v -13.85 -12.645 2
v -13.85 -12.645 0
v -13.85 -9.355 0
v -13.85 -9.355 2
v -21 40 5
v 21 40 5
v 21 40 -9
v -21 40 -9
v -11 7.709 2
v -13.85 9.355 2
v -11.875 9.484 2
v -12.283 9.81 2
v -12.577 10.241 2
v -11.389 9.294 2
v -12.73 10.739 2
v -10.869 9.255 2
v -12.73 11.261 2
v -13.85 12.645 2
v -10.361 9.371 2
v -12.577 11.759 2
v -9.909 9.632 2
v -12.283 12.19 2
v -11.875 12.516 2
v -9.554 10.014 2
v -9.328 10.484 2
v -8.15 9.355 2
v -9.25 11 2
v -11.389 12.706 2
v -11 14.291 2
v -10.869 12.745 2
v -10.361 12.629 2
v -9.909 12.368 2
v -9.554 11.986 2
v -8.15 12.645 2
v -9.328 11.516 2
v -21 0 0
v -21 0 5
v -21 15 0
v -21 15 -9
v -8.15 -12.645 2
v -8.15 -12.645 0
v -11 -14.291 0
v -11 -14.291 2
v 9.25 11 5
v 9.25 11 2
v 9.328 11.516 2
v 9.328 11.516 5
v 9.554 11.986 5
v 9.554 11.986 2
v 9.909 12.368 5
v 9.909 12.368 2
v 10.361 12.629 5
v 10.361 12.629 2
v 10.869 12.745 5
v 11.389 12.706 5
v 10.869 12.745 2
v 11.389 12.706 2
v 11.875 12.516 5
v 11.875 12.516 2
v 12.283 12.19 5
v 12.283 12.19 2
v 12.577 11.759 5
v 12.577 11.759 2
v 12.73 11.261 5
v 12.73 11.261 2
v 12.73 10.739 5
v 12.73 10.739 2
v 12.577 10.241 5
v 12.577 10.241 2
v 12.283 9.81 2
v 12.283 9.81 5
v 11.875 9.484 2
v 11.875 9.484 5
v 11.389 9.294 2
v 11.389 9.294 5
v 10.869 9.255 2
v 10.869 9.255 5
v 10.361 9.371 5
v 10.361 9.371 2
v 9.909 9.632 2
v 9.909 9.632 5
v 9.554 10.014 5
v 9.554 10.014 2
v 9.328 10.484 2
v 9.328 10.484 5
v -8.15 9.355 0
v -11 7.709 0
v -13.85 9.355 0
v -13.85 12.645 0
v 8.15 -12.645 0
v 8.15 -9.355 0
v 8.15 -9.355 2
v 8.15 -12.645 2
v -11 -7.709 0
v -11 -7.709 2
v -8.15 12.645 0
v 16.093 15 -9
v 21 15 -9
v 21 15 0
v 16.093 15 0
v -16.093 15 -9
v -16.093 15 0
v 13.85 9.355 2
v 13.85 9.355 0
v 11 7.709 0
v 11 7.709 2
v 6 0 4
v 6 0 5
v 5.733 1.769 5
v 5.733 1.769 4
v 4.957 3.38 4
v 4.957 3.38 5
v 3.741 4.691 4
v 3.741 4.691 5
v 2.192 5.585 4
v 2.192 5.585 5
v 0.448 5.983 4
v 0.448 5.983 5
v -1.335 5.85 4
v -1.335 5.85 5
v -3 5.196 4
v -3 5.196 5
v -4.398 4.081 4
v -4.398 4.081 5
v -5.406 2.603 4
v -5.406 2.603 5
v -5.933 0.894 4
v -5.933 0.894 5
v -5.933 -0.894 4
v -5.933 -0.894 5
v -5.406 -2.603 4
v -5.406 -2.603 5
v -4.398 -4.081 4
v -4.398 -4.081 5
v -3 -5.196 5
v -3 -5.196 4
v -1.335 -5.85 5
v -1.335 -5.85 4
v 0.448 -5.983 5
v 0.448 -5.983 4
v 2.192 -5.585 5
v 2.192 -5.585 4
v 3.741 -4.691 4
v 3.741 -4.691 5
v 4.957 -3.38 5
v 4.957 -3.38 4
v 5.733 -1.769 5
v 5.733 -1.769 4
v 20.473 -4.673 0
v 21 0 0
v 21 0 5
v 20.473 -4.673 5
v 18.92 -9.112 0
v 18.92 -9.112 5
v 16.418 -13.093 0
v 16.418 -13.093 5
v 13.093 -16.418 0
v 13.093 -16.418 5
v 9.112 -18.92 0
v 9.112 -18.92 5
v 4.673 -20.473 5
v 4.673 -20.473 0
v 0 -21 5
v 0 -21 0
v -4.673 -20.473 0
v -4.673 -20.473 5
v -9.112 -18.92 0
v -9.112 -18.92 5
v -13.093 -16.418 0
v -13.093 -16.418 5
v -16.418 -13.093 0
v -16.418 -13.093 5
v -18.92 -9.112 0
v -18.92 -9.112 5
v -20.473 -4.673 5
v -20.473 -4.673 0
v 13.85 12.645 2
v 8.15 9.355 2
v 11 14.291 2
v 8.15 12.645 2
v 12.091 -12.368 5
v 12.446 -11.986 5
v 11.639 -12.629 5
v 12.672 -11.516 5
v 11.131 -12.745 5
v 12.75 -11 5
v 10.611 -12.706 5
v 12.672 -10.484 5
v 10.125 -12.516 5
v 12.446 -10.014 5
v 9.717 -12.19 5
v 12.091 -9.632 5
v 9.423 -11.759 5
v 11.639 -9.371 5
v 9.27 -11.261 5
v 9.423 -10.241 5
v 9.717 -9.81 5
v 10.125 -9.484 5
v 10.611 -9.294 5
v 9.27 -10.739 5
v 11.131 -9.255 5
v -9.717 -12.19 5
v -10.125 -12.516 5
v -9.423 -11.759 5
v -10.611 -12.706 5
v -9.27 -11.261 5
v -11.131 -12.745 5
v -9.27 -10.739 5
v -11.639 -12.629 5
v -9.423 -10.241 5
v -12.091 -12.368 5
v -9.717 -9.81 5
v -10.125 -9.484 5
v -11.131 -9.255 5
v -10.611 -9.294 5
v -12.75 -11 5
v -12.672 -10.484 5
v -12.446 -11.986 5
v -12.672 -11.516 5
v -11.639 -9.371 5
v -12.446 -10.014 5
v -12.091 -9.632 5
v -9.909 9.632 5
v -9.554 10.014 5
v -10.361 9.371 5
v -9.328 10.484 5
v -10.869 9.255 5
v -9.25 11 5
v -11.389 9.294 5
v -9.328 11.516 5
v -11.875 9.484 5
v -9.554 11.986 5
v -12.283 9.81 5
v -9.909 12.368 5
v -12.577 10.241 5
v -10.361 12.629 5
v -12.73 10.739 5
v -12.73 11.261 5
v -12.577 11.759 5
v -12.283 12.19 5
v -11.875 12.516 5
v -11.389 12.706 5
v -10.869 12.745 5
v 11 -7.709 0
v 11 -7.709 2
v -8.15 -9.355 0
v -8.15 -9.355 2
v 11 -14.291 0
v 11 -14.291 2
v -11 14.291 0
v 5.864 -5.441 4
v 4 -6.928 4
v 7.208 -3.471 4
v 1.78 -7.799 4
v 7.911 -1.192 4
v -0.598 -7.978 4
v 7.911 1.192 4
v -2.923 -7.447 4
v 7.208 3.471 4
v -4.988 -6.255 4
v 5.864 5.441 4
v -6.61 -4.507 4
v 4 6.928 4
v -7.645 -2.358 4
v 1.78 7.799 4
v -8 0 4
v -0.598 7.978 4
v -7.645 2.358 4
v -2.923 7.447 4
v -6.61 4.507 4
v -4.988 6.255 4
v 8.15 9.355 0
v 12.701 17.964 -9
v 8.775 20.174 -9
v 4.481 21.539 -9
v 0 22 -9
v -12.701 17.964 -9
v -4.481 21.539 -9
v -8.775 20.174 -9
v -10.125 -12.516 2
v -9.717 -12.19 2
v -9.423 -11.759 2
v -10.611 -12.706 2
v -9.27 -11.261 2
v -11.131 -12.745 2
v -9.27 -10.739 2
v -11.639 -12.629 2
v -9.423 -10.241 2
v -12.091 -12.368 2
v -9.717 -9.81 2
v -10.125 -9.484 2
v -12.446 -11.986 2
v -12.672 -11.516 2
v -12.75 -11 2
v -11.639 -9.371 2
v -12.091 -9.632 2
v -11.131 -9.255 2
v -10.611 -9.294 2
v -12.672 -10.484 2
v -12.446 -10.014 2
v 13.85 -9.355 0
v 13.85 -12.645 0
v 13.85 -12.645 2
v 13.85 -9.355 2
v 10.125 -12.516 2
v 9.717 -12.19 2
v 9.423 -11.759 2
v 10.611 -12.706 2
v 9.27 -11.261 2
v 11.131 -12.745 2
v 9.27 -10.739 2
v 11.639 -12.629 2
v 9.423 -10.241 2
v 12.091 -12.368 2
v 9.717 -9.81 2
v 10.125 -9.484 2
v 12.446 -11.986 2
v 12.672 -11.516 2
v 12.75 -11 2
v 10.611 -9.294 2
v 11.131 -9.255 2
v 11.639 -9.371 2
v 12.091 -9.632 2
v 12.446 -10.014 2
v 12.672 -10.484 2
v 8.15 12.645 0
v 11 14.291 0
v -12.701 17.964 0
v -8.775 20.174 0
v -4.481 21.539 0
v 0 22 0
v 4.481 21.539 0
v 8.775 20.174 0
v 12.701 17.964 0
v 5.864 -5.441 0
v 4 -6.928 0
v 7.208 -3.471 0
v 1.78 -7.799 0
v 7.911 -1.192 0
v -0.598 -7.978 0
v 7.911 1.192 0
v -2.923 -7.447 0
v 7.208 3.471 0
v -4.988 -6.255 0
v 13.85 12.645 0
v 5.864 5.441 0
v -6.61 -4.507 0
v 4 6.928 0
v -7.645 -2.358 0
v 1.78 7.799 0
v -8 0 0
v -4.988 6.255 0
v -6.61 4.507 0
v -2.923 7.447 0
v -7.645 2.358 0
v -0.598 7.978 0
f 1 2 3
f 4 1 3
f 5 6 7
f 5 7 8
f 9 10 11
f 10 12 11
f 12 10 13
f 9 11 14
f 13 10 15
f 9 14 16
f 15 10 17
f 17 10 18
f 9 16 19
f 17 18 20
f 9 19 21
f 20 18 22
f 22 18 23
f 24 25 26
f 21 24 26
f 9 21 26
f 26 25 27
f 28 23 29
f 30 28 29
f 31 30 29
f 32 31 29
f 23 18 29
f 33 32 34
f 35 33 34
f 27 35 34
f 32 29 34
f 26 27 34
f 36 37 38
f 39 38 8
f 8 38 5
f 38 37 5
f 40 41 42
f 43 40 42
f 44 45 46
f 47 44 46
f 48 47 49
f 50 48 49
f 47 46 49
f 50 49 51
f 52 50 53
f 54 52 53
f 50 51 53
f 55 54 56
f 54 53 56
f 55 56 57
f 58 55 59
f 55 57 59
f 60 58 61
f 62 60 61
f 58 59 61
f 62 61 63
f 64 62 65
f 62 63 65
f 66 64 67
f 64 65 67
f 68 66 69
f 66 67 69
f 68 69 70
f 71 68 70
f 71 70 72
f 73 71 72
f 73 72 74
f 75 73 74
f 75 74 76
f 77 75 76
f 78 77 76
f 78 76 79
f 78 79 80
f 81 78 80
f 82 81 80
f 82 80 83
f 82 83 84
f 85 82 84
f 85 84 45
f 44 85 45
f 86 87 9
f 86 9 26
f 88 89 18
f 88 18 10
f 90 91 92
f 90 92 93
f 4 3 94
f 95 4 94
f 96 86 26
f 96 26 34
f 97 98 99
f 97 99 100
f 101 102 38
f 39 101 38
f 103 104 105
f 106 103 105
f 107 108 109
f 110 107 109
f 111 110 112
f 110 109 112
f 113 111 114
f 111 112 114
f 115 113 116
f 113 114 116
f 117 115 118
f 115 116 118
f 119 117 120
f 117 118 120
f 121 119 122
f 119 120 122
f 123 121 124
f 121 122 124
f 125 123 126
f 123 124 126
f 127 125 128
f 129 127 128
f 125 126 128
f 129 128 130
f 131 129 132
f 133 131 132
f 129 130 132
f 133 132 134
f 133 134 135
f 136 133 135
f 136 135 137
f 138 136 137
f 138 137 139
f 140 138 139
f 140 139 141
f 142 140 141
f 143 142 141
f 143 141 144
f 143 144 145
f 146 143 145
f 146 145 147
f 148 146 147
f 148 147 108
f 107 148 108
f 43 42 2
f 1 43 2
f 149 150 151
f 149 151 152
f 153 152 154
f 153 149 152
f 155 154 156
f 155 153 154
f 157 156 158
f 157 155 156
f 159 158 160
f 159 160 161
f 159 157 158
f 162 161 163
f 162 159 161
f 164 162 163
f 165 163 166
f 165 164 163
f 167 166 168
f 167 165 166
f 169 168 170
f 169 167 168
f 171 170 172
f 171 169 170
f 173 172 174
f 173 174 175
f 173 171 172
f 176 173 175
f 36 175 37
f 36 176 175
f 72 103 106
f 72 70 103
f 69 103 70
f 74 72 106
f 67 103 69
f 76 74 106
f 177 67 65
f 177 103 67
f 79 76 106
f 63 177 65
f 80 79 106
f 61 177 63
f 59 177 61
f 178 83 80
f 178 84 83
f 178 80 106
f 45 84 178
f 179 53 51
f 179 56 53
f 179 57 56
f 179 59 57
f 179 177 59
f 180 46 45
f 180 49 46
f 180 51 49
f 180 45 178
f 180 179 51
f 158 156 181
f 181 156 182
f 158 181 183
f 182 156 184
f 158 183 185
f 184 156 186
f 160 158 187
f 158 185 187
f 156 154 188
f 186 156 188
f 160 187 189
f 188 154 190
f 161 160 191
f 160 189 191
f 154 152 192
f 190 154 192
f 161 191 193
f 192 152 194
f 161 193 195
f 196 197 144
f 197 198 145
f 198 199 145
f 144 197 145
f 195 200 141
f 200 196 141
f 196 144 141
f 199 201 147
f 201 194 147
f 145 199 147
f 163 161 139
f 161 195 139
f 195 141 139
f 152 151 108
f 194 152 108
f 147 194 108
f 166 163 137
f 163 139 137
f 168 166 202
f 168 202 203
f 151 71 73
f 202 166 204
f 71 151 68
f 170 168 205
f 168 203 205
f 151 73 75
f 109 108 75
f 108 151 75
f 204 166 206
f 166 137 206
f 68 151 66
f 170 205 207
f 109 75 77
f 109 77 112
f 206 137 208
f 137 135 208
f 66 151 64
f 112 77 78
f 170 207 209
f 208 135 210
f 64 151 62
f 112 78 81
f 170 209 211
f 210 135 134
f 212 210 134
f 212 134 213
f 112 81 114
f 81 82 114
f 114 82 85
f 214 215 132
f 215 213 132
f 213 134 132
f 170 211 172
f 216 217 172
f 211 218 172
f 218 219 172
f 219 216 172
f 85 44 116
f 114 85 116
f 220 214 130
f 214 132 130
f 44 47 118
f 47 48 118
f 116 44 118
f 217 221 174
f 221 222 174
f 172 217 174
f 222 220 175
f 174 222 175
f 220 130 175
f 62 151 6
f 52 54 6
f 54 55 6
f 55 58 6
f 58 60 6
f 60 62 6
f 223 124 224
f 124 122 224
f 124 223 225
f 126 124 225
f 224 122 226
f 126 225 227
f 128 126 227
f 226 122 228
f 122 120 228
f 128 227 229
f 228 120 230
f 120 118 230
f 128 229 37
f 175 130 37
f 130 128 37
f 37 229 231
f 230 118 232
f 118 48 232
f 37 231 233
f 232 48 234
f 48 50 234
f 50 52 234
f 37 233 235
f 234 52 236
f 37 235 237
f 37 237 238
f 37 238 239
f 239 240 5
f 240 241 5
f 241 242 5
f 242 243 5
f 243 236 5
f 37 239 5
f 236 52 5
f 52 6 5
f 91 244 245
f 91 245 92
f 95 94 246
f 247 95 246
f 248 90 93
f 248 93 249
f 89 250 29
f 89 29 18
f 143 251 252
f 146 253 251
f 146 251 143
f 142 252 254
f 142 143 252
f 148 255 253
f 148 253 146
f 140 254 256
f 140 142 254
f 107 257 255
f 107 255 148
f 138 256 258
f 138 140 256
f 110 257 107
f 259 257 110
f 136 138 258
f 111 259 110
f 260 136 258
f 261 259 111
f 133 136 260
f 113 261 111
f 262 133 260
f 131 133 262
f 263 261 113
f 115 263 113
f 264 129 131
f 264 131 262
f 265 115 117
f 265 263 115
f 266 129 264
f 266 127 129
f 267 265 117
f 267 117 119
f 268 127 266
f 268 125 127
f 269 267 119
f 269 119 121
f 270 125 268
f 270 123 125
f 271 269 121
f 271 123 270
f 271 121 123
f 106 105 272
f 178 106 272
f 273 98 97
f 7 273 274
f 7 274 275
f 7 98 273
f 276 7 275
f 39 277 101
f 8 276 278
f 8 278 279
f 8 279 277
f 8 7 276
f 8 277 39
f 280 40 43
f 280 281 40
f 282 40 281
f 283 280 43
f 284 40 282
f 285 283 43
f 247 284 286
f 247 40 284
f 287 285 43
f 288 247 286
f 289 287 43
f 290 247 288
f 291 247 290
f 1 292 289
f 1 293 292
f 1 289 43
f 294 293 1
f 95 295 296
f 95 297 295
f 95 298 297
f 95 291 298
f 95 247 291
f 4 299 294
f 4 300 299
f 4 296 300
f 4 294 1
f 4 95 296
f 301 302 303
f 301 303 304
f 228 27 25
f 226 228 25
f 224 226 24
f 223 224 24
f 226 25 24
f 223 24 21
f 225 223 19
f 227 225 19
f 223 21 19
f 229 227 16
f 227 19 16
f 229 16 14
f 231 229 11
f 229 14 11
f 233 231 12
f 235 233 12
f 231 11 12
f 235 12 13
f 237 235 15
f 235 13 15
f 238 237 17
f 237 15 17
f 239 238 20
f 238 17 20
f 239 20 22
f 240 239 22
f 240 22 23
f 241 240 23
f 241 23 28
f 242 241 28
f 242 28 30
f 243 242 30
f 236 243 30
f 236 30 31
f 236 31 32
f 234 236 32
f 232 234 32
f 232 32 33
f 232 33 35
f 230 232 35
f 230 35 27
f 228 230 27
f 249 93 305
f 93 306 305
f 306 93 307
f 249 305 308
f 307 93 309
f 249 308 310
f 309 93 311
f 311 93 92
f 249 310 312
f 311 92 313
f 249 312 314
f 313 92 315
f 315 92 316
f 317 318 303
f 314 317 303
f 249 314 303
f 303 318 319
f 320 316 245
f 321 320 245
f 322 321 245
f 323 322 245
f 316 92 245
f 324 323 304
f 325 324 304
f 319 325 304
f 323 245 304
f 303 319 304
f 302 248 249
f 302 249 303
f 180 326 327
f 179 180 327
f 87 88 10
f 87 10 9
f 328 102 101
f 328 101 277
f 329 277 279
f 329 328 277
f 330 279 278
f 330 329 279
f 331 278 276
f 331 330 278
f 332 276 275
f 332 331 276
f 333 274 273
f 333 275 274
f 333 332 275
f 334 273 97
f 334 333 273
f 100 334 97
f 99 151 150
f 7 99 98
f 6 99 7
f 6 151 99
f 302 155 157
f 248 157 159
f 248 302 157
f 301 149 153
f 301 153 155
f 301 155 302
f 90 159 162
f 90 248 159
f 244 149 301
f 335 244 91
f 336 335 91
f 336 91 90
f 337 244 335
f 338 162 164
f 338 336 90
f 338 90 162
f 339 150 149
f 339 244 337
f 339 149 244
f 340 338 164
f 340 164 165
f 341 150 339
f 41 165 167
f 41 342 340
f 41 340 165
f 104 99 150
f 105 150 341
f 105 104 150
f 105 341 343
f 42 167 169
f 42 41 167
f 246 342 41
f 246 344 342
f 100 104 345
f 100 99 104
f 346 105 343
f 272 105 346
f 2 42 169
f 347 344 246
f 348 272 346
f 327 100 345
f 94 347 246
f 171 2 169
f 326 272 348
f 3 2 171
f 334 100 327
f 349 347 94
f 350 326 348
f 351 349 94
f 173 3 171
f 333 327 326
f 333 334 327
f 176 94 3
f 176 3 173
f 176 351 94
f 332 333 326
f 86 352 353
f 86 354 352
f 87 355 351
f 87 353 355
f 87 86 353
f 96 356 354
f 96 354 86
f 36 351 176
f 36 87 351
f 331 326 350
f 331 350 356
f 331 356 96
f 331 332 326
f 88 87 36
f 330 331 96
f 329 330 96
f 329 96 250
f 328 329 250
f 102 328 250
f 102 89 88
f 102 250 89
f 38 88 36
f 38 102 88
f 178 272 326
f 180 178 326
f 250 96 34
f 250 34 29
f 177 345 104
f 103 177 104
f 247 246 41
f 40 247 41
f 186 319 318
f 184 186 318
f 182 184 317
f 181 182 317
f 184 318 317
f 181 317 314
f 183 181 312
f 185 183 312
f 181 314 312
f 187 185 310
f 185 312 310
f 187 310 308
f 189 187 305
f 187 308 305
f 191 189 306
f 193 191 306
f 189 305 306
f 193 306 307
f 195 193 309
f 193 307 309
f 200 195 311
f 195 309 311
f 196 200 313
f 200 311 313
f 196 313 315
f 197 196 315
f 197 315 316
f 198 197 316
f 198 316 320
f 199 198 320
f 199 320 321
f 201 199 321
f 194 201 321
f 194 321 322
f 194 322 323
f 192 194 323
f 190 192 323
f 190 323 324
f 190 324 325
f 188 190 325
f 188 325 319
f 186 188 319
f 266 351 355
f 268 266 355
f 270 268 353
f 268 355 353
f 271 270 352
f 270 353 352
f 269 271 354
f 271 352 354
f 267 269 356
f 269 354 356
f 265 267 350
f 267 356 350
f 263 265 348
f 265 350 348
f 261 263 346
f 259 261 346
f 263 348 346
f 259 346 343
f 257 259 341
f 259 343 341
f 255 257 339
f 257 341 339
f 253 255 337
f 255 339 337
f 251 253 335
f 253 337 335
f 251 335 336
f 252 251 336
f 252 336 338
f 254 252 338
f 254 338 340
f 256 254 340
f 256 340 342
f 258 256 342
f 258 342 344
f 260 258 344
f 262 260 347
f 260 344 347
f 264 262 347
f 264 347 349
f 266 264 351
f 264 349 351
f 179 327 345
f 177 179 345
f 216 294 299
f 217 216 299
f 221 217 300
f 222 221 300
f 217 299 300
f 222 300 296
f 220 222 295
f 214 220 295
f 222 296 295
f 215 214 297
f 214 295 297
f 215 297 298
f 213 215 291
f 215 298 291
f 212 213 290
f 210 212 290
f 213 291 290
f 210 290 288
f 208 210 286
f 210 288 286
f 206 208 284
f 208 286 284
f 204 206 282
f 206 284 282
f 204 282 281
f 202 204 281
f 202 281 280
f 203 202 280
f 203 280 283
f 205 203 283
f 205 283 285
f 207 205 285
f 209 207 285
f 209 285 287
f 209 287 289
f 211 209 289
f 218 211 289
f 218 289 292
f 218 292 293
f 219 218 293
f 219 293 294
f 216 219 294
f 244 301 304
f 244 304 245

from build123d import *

# Parameters (mm, degrees)
BOSS_EXTRUDE1_DEPTH = 5
SKETCH2_R           = 6
CUT_EXTRUDE1_DEPTH  = 46.453272709
SKETCH3_R           = 8
CUT_EXTRUDE2_DEPTH  = 4
SKETCH4_R           = 1.75
CUT_EXTRUDE3_DEPTH  = 46.453272709
CUT_EXTRUDE4_DEPTH  = 2
SKETCH6_W           = 42
SKETCH6_H           = 25
BOSS_EXTRUDE2_DEPTH = 9
SKETCH7_R           = 22
CUT_EXTRUDE5_DEPTH  = 47.065171225


with BuildPart() as part:
    # Sketch1 → Boss-Extrude1 (new body)
    with BuildSketch(Plane.XY):
        with BuildLine():
            Line((-21, 40), (21, 40))
            Line((21, 40), (21, 0))
            ThreePointArc((21, 0), (0, -21), (-21, 0))
            Line((-21, 0), (-21, 40))
        make_face()
    extrude(amount=BOSS_EXTRUDE1_DEPTH)

    # Sketch2 → Cut-Extrude1 (cut, through all)
    with BuildSketch(Plane.XY.offset(5)):
        Circle(SKETCH2_R)
    extrude(amount=-CUT_EXTRUDE1_DEPTH, mode=Mode.SUBTRACT)

    # Sketch3 → Cut-Extrude2 (cut)
    with BuildSketch(Plane(origin=(0, 0, 0), x_dir=(-1, 0, 0), z_dir=(0, 0, -1))):
        Circle(SKETCH3_R)
    extrude(amount=-CUT_EXTRUDE2_DEPTH, mode=Mode.SUBTRACT)

    # Sketch4 → Cut-Extrude3 (cut, through all)
    with BuildSketch(Plane(origin=(0, 0, 0), x_dir=(-1, 0, 0), z_dir=(0, 0, -1))):
        with Locations((-11, 11)):
            Circle(SKETCH4_R)
        with Locations(Location((-11, -11, 0), (0, 0, 180))):
            Circle(SKETCH4_R)
        with Locations((11, -11)):
            Circle(SKETCH4_R)
        with Locations(Location((11, 11, 0), (0, 0, 180))):
            Circle(SKETCH4_R)
    extrude(amount=-CUT_EXTRUDE3_DEPTH, mode=Mode.SUBTRACT)

    # Sketch5 → Cut-Extrude4 (cut)
    with BuildSketch(Plane(origin=(0, 0, 0), x_dir=(-1, 0, 0), z_dir=(0, 0, -1))):
        Polygon((-11, 14.290896534), (-13.85, 12.645448267), (-13.85, 9.354551733), (-11, 7.709103466), (-8.15, 9.354551733), (-8.15, 12.645448267), align=None)
        Polygon((-8.15, -12.645448267), (-11, -14.290896534), (-13.85, -12.645448267), (-13.85, -9.354551733), (-11, -7.709103466), (-8.15, -9.354551733), align=None)
        Polygon((11, -14.290896534), (13.85, -12.645448267), (13.85, -9.354551733), (11, -7.709103466), (8.15, -9.354551733), (8.15, -12.645448267), align=None)
        Polygon((8.15, 12.645448267), (11, 14.290896534), (13.85, 12.645448267), (13.85, 9.354551733), (11, 7.709103466), (8.15, 9.354551733), align=None)
    extrude(amount=-CUT_EXTRUDE4_DEPTH, mode=Mode.SUBTRACT)

    # Sketch6 → Boss-Extrude2 (add)
    with BuildSketch(Plane(origin=(0, 0, 0), x_dir=(-1, 0, 0), z_dir=(0, 0, -1))):
        with Locations((0, 27.5)):
            Rectangle(SKETCH6_W, SKETCH6_H)
    extrude(amount=BOSS_EXTRUDE2_DEPTH)

    # Sketch7 → Cut-Extrude5 (cut, through all)
    with BuildSketch(Plane(origin=(0, 0, 0), x_dir=(-1, 0, 0), z_dir=(0, 0, -1))):
        Circle(SKETCH7_R)
    extrude(amount=CUT_EXTRUDE5_DEPTH, mode=Mode.SUBTRACT)


solid = part.part
